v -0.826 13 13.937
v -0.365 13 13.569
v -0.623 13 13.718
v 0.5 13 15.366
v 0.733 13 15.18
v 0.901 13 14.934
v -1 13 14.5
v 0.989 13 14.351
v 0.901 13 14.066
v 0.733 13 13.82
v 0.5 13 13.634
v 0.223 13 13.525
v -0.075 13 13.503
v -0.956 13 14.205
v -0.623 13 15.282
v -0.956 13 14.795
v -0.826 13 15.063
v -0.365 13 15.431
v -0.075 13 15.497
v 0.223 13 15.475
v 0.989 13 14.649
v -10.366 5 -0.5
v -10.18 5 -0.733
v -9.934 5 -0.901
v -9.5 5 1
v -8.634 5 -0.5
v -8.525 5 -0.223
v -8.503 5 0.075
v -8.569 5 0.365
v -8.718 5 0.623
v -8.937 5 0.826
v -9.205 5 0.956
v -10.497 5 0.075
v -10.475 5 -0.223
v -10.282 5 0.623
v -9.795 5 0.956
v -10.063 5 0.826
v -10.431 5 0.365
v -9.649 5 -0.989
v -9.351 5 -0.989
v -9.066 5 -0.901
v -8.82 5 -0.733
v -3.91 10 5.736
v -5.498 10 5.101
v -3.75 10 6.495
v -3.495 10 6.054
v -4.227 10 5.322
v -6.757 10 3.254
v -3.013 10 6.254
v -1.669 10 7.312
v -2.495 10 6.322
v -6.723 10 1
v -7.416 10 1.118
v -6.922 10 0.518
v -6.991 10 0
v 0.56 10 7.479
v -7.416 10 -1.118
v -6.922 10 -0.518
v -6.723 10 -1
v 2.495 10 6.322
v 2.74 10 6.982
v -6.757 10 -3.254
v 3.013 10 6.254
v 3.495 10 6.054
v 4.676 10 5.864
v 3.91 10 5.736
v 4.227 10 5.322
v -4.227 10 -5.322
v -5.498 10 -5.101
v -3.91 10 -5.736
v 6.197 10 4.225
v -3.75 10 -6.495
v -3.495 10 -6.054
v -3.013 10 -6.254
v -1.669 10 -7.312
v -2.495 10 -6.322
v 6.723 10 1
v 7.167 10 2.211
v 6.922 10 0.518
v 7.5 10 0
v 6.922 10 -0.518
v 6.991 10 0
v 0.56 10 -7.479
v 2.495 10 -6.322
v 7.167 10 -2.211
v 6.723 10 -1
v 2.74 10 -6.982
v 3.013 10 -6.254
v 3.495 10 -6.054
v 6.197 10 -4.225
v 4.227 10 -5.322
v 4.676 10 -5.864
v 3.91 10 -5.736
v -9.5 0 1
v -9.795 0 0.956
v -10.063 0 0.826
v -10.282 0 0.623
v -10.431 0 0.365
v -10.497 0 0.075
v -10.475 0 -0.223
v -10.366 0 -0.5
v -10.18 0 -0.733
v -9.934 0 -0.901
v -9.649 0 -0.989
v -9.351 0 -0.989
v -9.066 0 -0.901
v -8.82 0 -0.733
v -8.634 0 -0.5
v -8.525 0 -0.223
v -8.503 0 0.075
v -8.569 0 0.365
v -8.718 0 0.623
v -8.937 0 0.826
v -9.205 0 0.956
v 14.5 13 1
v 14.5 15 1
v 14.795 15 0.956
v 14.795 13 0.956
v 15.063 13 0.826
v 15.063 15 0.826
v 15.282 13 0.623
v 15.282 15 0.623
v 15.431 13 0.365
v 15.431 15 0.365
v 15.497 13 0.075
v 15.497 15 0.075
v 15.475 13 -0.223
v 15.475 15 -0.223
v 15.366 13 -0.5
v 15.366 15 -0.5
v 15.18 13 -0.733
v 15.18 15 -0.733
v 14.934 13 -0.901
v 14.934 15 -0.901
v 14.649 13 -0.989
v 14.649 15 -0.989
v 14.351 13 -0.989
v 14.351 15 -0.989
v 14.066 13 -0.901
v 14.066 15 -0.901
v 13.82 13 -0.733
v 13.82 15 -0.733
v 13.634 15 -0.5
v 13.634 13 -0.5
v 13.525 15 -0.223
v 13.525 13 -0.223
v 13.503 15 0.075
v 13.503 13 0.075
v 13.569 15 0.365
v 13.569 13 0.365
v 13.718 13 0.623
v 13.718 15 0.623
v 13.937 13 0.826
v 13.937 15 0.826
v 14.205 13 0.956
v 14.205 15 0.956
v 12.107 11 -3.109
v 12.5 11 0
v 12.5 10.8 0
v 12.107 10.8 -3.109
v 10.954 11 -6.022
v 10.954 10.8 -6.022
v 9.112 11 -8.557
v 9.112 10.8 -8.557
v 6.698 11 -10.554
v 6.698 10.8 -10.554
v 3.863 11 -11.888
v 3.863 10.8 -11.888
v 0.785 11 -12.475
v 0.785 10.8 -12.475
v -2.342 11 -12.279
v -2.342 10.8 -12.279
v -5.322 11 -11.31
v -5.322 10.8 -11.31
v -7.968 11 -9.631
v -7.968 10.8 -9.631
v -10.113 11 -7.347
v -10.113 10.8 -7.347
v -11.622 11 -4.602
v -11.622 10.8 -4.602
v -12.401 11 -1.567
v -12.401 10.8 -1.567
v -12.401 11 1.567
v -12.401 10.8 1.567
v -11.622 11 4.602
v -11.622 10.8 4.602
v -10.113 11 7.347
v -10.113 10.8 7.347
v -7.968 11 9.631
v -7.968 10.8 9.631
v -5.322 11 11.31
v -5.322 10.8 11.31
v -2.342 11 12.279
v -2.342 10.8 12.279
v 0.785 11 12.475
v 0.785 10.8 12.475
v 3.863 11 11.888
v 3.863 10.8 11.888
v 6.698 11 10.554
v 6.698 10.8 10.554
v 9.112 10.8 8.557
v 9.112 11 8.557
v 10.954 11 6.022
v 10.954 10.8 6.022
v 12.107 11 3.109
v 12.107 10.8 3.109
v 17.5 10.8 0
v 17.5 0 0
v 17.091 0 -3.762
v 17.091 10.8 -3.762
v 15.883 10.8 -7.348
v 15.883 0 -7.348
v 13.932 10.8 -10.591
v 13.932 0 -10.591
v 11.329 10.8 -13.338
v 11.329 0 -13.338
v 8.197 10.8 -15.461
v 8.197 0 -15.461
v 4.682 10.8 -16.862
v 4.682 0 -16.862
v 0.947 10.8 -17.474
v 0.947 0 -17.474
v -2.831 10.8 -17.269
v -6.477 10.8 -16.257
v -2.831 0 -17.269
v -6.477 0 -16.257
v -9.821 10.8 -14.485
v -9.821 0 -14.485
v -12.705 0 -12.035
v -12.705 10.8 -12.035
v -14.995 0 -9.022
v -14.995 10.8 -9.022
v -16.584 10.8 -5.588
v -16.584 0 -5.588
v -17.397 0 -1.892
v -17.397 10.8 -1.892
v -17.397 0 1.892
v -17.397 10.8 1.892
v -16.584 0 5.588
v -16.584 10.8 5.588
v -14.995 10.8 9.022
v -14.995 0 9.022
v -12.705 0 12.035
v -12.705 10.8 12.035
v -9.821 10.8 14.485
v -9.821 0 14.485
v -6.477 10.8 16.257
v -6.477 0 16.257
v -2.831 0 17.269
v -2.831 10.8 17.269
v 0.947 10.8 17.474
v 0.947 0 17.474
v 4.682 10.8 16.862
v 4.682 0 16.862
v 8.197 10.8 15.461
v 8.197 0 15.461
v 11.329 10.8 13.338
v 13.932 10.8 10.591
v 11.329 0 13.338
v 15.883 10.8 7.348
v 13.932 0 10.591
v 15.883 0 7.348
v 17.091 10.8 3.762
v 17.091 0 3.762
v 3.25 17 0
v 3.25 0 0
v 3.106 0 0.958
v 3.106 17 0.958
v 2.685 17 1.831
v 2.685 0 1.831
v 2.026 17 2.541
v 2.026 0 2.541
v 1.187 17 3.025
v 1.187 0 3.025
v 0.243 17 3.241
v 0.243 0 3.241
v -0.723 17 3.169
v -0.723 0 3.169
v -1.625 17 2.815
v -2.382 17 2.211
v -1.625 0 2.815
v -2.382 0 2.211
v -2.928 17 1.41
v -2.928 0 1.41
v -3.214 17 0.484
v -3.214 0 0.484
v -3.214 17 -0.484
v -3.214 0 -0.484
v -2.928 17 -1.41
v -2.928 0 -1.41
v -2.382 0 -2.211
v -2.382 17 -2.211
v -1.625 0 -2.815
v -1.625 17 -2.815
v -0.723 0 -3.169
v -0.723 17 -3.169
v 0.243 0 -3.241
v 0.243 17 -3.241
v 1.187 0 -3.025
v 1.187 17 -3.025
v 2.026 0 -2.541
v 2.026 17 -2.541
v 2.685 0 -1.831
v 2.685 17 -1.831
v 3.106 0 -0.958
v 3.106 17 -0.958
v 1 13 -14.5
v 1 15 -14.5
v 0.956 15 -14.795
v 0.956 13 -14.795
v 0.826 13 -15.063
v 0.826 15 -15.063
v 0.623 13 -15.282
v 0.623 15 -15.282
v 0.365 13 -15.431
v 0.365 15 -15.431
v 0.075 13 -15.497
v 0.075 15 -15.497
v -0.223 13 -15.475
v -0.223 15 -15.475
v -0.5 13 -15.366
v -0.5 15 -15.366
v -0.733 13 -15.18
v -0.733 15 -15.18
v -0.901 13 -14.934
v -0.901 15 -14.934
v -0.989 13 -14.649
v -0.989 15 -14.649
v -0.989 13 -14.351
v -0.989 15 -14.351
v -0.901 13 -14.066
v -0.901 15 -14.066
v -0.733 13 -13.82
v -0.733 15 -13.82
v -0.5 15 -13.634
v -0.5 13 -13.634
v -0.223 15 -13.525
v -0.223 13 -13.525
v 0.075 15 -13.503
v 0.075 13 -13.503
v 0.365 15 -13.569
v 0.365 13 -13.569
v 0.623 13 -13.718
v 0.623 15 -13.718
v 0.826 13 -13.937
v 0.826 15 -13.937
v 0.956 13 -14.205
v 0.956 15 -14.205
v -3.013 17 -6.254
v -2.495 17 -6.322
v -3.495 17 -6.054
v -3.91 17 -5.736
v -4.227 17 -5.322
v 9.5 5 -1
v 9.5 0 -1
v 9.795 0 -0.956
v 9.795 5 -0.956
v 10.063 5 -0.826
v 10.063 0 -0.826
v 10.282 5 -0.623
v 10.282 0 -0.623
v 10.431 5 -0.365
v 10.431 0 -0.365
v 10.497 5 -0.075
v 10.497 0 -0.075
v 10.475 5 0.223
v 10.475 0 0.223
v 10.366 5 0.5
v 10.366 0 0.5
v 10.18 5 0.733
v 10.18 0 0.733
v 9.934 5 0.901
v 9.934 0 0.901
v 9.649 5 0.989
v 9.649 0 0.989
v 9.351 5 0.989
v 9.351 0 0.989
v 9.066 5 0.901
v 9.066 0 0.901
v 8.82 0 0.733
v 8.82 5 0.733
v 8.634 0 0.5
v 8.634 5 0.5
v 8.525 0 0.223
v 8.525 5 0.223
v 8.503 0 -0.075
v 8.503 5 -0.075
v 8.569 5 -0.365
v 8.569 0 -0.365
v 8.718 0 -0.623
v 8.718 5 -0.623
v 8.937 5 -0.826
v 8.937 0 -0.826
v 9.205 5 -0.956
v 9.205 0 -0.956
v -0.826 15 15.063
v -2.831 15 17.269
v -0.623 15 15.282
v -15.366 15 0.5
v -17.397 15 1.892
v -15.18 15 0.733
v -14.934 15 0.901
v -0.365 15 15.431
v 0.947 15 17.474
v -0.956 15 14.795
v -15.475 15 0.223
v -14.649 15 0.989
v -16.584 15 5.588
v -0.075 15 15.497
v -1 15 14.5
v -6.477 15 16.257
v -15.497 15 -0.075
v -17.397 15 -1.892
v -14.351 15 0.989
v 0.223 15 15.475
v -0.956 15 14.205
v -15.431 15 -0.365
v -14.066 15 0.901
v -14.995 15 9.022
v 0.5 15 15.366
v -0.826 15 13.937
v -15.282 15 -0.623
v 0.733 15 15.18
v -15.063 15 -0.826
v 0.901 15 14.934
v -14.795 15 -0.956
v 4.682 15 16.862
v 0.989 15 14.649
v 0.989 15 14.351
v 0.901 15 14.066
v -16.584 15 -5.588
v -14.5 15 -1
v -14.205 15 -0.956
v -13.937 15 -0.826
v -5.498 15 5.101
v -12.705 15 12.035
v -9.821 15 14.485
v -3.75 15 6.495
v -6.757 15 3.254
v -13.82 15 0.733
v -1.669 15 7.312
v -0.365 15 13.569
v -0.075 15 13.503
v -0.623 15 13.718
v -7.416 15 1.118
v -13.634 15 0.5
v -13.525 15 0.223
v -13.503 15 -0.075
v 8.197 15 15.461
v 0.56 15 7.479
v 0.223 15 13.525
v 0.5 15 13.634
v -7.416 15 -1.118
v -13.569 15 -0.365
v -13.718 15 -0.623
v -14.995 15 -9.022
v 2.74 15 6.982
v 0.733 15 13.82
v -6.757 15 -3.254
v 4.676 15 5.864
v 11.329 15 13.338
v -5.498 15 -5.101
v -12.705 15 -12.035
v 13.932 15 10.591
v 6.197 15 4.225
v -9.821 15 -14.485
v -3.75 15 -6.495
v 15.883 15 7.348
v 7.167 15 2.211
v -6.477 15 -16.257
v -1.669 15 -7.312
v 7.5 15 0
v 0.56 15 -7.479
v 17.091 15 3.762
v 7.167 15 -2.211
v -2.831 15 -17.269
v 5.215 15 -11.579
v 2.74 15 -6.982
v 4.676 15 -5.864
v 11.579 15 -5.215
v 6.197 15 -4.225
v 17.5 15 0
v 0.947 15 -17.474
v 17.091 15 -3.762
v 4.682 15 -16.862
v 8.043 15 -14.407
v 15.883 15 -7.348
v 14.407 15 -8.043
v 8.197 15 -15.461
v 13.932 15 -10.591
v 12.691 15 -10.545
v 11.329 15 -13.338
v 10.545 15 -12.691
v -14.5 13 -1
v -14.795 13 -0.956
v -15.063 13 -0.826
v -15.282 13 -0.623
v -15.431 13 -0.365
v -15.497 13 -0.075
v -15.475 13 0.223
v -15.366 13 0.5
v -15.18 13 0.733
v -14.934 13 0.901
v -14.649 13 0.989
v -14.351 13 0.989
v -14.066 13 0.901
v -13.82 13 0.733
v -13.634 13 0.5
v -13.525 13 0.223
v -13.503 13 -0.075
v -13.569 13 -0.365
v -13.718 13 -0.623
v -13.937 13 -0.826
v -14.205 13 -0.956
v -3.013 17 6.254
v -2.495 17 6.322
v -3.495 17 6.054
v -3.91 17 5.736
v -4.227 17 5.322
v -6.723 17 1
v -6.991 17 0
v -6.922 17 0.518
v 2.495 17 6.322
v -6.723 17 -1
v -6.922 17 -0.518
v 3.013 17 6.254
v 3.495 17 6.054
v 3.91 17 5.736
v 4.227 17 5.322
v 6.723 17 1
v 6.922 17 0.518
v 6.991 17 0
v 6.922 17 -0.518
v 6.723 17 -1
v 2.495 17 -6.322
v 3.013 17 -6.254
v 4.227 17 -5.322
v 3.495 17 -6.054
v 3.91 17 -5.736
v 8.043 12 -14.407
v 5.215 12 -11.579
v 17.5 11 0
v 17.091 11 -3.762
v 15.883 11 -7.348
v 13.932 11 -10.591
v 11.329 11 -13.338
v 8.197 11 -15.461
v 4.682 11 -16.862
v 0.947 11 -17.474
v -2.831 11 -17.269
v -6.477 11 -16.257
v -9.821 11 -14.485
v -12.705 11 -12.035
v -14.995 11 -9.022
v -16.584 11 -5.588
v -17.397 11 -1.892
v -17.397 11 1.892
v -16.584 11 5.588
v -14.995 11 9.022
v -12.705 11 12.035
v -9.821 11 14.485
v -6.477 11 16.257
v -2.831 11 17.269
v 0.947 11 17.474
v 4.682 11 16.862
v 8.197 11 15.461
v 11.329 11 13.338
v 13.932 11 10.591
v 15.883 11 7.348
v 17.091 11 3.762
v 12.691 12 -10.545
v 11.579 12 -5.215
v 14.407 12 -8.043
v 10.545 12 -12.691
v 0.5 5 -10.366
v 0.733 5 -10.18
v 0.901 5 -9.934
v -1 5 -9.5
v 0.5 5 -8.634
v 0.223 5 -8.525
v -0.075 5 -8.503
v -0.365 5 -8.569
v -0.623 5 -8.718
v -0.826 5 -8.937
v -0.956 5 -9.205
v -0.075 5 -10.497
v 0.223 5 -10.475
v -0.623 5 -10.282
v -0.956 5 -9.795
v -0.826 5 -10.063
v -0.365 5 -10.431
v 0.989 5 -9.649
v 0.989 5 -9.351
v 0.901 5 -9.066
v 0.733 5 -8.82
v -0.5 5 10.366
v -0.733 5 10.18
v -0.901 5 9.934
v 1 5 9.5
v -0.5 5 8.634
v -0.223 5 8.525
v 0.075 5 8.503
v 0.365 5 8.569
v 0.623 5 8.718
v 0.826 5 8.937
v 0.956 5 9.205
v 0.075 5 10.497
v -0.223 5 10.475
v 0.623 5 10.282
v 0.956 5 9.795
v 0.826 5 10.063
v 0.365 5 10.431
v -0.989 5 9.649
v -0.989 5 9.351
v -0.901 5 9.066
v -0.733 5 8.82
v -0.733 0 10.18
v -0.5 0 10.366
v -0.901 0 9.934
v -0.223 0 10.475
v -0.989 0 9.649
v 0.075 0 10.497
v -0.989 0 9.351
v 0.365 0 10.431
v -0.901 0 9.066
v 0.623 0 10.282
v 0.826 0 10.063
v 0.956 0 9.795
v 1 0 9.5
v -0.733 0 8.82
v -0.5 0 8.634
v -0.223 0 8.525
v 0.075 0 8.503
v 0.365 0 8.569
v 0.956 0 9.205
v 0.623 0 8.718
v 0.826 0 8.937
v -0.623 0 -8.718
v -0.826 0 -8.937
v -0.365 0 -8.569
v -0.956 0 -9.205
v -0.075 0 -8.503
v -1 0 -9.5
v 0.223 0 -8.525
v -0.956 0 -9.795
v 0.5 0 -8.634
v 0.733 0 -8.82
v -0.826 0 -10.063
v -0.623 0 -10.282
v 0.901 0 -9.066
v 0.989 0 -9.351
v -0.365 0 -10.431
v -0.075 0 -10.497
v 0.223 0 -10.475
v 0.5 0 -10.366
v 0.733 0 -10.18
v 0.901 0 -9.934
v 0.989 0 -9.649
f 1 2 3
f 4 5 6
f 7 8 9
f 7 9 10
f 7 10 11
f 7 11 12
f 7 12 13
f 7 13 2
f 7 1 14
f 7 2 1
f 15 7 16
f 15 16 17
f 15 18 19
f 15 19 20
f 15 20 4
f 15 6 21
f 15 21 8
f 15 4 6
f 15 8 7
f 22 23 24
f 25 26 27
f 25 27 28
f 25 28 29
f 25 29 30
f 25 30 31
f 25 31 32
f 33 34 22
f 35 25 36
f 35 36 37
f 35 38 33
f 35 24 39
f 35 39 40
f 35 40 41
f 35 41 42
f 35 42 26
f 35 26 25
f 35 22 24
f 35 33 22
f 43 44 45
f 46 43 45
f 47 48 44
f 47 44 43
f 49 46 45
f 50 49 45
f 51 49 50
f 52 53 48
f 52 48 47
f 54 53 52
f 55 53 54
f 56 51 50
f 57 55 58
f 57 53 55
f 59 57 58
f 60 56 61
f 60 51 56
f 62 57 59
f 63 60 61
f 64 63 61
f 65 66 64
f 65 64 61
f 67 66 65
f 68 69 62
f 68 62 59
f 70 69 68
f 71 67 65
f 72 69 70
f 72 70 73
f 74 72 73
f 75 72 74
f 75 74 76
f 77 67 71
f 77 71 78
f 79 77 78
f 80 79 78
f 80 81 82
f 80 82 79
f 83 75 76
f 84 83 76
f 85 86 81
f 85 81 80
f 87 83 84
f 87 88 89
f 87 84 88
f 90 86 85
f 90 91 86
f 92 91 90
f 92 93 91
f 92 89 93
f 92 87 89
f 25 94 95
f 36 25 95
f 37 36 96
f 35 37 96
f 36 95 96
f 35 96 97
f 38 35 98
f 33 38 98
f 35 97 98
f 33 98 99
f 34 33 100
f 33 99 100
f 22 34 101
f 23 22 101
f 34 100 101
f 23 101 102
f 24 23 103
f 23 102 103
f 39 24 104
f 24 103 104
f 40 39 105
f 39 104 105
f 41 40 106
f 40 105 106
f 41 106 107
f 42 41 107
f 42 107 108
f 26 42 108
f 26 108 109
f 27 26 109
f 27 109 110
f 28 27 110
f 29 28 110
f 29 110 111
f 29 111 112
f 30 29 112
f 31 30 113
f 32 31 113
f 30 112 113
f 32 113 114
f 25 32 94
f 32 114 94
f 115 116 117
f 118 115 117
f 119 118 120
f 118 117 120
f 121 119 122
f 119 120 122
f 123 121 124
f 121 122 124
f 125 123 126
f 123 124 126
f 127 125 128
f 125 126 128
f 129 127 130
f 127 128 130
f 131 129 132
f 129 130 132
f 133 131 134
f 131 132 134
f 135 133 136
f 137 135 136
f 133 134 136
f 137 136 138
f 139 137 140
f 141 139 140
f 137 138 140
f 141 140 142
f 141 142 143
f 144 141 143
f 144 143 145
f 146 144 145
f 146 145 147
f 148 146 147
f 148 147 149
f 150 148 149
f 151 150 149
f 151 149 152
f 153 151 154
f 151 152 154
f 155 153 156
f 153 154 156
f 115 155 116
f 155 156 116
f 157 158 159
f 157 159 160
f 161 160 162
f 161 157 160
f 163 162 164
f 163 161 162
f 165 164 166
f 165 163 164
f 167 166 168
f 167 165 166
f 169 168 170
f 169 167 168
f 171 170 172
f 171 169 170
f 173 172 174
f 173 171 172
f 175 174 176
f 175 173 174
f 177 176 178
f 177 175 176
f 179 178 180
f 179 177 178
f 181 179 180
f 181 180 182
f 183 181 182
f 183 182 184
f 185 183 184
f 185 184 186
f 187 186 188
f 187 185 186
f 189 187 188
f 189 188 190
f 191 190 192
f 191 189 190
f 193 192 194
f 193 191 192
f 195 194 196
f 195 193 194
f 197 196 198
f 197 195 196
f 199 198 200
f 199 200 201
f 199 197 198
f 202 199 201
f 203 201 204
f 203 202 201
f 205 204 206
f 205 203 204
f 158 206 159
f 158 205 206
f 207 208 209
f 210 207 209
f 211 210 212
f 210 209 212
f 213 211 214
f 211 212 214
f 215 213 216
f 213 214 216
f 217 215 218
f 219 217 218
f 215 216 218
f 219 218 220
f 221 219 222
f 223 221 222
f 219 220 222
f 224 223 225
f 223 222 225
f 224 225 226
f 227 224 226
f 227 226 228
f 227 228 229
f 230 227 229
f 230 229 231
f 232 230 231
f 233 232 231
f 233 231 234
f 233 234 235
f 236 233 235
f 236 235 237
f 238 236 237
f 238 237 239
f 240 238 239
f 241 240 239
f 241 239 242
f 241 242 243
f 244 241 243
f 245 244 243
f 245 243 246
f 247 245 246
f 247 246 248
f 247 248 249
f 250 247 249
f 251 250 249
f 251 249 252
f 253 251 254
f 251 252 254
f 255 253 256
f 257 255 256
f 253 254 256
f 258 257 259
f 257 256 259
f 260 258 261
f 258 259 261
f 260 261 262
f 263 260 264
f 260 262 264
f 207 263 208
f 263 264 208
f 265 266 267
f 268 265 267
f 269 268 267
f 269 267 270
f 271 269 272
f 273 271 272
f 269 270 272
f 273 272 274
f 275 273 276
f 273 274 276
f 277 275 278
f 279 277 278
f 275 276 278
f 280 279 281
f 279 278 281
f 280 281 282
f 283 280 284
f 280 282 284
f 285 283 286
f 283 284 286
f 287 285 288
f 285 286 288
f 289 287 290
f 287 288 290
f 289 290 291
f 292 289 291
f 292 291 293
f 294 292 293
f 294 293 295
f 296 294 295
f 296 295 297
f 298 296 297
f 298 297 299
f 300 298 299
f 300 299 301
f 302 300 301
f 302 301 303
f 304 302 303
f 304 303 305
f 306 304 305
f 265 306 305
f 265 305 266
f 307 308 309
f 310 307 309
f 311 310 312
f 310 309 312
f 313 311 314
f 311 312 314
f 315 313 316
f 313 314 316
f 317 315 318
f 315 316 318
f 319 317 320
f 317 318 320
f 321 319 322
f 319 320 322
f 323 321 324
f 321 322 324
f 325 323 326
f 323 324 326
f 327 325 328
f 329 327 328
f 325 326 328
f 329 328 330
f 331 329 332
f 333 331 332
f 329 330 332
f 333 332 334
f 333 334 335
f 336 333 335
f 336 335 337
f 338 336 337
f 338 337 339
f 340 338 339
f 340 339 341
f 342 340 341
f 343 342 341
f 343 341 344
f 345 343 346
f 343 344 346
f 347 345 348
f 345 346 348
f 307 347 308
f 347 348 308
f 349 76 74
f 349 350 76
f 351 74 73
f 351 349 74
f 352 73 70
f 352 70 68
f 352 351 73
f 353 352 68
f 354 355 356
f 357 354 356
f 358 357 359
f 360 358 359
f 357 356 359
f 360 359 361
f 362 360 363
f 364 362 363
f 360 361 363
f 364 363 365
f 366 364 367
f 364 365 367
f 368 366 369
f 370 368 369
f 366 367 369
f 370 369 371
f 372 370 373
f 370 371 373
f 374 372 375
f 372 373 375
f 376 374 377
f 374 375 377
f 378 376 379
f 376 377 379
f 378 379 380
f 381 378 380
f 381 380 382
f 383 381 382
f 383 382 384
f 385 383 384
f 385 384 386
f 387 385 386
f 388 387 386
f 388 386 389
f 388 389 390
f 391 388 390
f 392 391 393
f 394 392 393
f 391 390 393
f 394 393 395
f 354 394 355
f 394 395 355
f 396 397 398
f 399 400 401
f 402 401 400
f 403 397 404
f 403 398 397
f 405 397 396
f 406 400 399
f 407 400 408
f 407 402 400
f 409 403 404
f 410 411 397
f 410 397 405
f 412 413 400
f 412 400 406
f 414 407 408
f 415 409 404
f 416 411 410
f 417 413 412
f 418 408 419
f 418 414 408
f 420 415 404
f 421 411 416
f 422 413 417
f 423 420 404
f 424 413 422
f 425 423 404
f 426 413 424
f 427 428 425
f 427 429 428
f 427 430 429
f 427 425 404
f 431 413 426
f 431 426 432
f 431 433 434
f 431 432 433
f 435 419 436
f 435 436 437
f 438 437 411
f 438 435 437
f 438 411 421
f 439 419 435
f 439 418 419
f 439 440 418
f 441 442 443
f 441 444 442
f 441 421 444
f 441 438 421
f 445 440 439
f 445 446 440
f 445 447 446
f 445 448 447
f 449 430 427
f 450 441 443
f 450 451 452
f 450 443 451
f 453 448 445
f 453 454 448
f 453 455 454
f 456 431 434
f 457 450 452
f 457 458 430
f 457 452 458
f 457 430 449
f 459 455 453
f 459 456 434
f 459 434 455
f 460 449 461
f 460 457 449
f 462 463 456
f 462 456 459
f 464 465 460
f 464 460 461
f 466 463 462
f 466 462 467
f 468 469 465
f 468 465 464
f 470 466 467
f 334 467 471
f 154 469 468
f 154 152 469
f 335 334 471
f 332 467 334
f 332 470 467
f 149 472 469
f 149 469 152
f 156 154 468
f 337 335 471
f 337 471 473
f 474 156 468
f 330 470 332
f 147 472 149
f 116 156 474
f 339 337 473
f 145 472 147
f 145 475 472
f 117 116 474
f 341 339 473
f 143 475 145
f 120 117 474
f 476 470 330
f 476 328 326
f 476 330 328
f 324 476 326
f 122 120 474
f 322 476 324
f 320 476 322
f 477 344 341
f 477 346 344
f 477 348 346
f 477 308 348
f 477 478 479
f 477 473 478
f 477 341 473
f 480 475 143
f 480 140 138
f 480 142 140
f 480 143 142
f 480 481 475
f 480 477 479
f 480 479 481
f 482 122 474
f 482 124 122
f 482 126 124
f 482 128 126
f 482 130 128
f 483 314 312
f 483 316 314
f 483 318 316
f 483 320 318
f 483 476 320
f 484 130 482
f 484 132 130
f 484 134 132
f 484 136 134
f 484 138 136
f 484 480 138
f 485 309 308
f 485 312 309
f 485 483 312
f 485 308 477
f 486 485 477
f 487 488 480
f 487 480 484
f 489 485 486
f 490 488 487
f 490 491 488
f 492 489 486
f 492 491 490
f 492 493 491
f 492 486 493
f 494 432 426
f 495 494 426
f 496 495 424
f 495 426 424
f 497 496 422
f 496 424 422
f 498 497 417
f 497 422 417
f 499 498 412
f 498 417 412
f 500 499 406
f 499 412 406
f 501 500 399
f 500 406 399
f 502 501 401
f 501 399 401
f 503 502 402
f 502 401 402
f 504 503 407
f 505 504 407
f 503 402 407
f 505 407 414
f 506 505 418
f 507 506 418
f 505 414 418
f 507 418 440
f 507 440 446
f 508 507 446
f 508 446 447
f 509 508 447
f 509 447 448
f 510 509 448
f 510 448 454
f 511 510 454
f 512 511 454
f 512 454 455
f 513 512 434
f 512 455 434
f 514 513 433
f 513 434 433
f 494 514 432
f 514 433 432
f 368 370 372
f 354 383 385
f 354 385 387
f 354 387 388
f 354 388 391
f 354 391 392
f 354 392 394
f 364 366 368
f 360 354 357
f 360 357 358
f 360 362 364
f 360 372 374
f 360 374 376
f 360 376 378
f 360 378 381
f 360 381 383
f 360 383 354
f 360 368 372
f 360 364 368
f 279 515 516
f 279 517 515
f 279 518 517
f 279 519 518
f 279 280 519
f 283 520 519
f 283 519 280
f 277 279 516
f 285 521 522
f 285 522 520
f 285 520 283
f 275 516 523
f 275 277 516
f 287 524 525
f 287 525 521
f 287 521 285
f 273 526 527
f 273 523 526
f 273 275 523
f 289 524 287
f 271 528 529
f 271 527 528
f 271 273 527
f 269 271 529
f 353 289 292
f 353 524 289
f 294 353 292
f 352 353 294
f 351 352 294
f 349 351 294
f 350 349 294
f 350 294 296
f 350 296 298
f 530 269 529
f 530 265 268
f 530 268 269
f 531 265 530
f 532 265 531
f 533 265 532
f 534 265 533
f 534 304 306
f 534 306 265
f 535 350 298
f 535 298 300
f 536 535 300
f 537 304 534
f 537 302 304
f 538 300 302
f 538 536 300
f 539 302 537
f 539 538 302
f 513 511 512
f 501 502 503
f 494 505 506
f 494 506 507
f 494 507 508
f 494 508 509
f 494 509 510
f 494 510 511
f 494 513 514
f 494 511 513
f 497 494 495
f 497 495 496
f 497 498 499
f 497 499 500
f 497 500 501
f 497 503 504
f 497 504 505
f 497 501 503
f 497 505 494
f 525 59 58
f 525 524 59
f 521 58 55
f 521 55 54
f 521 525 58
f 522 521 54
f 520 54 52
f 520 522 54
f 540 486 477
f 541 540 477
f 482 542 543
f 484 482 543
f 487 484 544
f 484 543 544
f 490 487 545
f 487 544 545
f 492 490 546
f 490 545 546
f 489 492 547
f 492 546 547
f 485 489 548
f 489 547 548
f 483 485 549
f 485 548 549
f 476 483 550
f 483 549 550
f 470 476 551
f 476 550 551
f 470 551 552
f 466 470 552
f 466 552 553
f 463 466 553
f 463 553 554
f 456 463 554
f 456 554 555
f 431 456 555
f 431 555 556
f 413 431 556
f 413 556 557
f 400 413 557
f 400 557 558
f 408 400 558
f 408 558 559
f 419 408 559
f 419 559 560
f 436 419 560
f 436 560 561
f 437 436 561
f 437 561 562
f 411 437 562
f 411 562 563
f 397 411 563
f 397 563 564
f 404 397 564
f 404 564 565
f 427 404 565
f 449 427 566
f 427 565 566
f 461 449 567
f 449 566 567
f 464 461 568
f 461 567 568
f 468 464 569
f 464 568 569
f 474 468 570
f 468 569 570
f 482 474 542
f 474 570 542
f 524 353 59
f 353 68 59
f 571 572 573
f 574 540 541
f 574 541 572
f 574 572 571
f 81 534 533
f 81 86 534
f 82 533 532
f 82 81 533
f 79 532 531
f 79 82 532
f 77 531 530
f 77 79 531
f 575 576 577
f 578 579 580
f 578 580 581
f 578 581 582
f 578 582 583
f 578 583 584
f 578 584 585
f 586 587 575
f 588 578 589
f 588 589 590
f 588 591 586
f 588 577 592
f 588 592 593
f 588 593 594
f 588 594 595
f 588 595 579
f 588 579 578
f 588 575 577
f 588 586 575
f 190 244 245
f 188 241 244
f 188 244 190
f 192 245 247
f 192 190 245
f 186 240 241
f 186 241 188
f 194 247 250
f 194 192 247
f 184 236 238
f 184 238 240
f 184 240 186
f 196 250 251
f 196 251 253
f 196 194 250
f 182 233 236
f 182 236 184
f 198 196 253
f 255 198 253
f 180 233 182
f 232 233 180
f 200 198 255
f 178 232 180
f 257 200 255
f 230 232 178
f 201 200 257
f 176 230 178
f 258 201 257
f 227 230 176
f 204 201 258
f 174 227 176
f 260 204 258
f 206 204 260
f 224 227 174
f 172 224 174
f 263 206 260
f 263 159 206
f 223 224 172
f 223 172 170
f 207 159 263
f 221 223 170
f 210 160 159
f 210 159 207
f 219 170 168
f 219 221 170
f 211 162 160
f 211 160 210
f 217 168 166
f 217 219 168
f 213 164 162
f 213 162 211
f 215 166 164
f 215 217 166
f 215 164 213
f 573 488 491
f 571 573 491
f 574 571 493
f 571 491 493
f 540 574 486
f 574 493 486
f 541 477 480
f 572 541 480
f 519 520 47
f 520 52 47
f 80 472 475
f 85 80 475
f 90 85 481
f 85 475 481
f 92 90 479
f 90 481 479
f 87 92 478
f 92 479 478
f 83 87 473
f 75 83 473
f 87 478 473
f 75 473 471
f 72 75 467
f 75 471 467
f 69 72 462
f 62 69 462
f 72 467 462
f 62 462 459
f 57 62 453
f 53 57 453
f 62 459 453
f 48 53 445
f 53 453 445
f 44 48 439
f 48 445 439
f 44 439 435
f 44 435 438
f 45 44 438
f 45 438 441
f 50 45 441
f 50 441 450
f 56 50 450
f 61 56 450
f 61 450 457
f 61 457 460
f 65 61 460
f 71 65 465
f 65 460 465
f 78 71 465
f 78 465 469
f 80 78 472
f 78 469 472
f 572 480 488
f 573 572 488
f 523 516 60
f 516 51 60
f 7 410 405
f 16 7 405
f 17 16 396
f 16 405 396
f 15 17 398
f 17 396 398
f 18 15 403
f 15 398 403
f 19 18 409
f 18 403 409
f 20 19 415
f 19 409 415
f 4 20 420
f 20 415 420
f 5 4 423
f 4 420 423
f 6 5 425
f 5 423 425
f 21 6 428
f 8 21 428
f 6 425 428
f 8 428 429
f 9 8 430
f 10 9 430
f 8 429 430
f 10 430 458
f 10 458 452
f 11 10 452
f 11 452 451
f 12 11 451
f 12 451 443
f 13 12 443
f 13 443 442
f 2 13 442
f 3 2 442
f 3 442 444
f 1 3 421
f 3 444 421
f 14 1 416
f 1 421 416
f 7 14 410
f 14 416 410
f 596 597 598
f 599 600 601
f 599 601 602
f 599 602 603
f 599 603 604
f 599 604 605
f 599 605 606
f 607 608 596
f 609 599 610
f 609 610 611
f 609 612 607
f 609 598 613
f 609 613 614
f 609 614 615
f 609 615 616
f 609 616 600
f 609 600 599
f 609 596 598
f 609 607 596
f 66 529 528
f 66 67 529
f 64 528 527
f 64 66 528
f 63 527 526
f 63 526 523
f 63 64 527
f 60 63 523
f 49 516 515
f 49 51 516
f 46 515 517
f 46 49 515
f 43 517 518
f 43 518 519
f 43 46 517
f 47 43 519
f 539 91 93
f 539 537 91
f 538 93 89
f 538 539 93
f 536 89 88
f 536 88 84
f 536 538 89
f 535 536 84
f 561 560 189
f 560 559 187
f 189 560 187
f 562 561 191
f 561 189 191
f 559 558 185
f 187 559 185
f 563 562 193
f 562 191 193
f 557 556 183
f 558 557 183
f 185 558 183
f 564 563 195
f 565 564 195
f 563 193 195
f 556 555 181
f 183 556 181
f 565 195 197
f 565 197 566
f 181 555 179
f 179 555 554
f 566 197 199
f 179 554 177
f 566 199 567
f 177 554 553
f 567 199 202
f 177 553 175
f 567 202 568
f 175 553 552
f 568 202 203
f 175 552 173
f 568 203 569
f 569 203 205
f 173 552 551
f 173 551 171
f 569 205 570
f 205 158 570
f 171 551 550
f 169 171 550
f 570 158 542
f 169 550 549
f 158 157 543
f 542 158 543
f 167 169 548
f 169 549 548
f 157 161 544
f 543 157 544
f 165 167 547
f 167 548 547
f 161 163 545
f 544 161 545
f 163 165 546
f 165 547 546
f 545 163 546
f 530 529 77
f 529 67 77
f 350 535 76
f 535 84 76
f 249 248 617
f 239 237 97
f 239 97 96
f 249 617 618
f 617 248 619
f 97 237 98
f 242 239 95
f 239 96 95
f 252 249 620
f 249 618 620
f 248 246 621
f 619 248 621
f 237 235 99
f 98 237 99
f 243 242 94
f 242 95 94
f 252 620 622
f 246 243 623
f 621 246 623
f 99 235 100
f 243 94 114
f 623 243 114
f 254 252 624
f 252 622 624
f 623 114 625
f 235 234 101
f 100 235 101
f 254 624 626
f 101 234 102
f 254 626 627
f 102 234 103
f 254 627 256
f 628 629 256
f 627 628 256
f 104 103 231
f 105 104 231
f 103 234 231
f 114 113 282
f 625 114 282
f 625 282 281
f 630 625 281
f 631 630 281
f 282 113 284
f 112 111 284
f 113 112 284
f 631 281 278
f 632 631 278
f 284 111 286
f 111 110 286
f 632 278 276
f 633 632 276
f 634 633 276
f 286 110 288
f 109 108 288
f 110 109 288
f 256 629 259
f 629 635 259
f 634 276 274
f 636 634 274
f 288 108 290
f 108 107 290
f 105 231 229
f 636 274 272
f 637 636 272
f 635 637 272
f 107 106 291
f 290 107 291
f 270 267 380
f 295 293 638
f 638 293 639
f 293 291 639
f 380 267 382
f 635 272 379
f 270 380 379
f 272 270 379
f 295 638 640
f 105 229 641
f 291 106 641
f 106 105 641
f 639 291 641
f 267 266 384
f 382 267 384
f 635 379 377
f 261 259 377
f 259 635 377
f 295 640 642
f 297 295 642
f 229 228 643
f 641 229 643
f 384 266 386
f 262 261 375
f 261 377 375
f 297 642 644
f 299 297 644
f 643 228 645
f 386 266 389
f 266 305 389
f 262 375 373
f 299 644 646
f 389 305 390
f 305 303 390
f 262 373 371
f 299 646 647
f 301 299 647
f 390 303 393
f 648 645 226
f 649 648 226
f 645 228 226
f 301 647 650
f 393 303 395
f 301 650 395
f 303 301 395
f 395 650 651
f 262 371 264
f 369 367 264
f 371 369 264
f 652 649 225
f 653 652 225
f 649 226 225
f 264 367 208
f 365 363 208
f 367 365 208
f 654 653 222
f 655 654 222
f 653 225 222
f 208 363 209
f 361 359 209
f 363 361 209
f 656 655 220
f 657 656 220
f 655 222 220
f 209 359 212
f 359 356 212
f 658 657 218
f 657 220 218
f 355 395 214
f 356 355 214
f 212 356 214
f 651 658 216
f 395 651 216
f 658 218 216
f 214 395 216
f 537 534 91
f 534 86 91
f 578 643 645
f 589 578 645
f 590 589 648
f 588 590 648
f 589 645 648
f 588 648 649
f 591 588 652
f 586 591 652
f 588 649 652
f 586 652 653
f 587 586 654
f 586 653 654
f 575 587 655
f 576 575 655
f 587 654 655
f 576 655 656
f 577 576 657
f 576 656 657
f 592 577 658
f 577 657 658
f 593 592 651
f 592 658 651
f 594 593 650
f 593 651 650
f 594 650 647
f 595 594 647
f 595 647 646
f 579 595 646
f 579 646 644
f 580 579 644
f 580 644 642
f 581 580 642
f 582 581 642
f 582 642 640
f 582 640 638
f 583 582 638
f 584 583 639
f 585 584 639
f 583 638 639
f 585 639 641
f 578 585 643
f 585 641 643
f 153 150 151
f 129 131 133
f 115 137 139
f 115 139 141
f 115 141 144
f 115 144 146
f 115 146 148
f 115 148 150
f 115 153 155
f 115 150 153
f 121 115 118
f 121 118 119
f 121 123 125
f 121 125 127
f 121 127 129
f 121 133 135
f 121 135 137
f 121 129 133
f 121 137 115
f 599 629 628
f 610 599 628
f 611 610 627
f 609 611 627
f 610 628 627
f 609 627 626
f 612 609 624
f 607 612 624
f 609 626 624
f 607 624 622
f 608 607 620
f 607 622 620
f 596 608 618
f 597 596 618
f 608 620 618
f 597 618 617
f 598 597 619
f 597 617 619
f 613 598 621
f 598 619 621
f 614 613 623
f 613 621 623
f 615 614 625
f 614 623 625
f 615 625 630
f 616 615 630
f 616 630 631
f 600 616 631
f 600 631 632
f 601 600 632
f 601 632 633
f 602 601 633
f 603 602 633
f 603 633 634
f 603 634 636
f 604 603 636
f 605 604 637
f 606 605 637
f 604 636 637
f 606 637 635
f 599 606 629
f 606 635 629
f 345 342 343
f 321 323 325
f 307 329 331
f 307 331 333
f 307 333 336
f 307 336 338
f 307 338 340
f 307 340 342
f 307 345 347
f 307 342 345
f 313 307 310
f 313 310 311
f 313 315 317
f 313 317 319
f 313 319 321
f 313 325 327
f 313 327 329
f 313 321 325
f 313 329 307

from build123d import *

# Parameters (mm, degrees)
SKETCH1_R           = 17.5
BOSS_EXTRUDE1_DEPTH = 15
BOSS_EXTRUDE2_DEPTH = 2
CUT_EXTRUDE1_REACH  = 19
SKETCH3_R           = 3.25
SKETCH4_R           = 1
CUT_EXTRUDE2_DEPTH  = 5
CIRPATTERN1_COUNT   = 4
SKETCH5_R           = 1
CUT_EXTRUDE3_DEPTH  = 2
CIRPATTERN2_COUNT   = 4
SKETCH6_R           = 7.5
CUT_EXTRUDE4_DEPTH  = 5
CUT_EXTRUDE6_START  = -4
SKETCH7_R           = 17.5
SKETCH7_R_2         = 12.5
CUT_EXTRUDE6_DEPTH  = 0.2
FILLET1_R           = 2
CUT_EXTRUDE7_DEPTH  = 3


with BuildPart() as part:
    # Sketch1 → Boss-Extrude1 (new body)
    with BuildSketch(Plane(origin=(0, 0, 0), x_dir=(1, 0, 0), z_dir=(0, 1, 0))):
        Circle(SKETCH1_R)
    extrude(amount=BOSS_EXTRUDE1_DEPTH)

    # Sketch2 → Boss-Extrude2 (add)
    with BuildSketch(Plane(origin=(0, 15, 0), x_dir=(1, 0, 0), z_dir=(0, 1, 0))):
        Polygon((7.3, 0), (3.65, 6.321985448), (-3.65, 6.321985448), (-7.3, 0), (-3.65, -6.321985448), (3.65, -6.321985448), align=None)
    extrude(amount=BOSS_EXTRUDE2_DEPTH)

    # Sketch3 → Cut-Extrude1 (cut, up to next)
    with BuildSketch(Plane.XZ, mode=Mode.PRIVATE) as cut_extrude1_sk1:
        Circle(SKETCH3_R)
    cut_extrude1_tool1 = extrude(cut_extrude1_sk1.sketch, amount=-CUT_EXTRUDE1_REACH, mode=Mode.PRIVATE) & part.part
    add(cut_extrude1_tool1.solids().sort_by_distance((0, 0, 0))[0], mode=Mode.SUBTRACT)

    # Sketch4 → Cut-Extrude2 (cut)
    with BuildSketch(Plane.XZ):
        with Locations((0, 9.5)):
            Circle(SKETCH4_R)
    cut_extrude2 = extrude(amount=-CUT_EXTRUDE2_DEPTH, mode=Mode.SUBTRACT)

    # CirPattern1: Cut-Extrude2 ×4 about axis
    cirpattern1_axis = Axis((0, 0, 0), (0, 1, 0))
    for i in range(1, CIRPATTERN1_COUNT):
        add(cut_extrude2.rotate(cirpattern1_axis, i * 360 / CIRPATTERN1_COUNT), mode=Mode.SUBTRACT)

    # Sketch5 → Cut-Extrude3 (cut)
    with BuildSketch(Plane(origin=(0, 15, 0), x_dir=(1, 0, 0), z_dir=(0, 1, 0))):
        with Locations((0, 14.5)):
            Circle(SKETCH5_R)
    cut_extrude3 = extrude(amount=-CUT_EXTRUDE3_DEPTH, mode=Mode.SUBTRACT)

    # CirPattern2: Cut-Extrude3 ×4 about axis
    cirpattern2_axis = Axis((0, 0, 0), (0, 1, 0))
    for i in range(1, CIRPATTERN2_COUNT):
        add(cut_extrude3.rotate(cirpattern2_axis, i * 360 / CIRPATTERN2_COUNT), mode=Mode.SUBTRACT)

    # Sketch6 → Cut-Extrude4 (cut)
    with BuildSketch(Plane(origin=(0, 15, 0), x_dir=(1, 0, 0), z_dir=(0, 1, 0))):
        Circle(SKETCH6_R)
        Polygon((7.3, 0), (3.65, 6.321985448), (-3.65, 6.321985448), (-7.3, 0), (-3.65, -6.321985448), (3.65, -6.321985448), align=None, mode=Mode.SUBTRACT)
    extrude(amount=-CUT_EXTRUDE4_DEPTH, mode=Mode.SUBTRACT)

    # Sketch7 → Cut-Extrude6 (cut)
    with BuildSketch(Plane(origin=(0, 15, 0), x_dir=(1, 0, 0), z_dir=(0, 1, 0)).offset(CUT_EXTRUDE6_START)):
        Circle(SKETCH7_R)
        Circle(SKETCH7_R_2, mode=Mode.SUBTRACT)
    extrude(amount=-CUT_EXTRUDE6_DEPTH, mode=Mode.SUBTRACT)

    # Fillet1
    fillet1_edges = [part.edges().sort_by_distance(p)[0] for p in [
        (-7.3, 13.5, 0),
        (-3.65, 13.5, 6.321985448),
        (3.65, 13.5, 6.321985448),
        (7.3, 13.5, 0),
        (3.65, 13.5, -6.321985448),
        (-3.65, 13.5, -6.321985448),
    ]]
    fillet(fillet1_edges, radius=FILLET1_R)

    # Sketch8 → Cut-Extrude7 (cut)
    with BuildSketch(Plane(origin=(0, 15, 0), x_dir=(1, 0, 0), z_dir=(0, 1, 0))):
        with BuildLine():
            Line((8.042991645, 14.406952676), (5.21456452, 11.578525551))
            Line((5.21456452, 11.578525551), (11.578525551, 5.21456452))
            Line((11.578525551, 5.21456452), (14.406952676, 8.042991645))
            ThreePointArc((14.406952676, 8.042991645), (11.66726189, 11.66726189), (8.042991645, 14.406952676))
        make_face()
    extrude(amount=-CUT_EXTRUDE7_DEPTH, mode=Mode.SUBTRACT)


solid = part.part
